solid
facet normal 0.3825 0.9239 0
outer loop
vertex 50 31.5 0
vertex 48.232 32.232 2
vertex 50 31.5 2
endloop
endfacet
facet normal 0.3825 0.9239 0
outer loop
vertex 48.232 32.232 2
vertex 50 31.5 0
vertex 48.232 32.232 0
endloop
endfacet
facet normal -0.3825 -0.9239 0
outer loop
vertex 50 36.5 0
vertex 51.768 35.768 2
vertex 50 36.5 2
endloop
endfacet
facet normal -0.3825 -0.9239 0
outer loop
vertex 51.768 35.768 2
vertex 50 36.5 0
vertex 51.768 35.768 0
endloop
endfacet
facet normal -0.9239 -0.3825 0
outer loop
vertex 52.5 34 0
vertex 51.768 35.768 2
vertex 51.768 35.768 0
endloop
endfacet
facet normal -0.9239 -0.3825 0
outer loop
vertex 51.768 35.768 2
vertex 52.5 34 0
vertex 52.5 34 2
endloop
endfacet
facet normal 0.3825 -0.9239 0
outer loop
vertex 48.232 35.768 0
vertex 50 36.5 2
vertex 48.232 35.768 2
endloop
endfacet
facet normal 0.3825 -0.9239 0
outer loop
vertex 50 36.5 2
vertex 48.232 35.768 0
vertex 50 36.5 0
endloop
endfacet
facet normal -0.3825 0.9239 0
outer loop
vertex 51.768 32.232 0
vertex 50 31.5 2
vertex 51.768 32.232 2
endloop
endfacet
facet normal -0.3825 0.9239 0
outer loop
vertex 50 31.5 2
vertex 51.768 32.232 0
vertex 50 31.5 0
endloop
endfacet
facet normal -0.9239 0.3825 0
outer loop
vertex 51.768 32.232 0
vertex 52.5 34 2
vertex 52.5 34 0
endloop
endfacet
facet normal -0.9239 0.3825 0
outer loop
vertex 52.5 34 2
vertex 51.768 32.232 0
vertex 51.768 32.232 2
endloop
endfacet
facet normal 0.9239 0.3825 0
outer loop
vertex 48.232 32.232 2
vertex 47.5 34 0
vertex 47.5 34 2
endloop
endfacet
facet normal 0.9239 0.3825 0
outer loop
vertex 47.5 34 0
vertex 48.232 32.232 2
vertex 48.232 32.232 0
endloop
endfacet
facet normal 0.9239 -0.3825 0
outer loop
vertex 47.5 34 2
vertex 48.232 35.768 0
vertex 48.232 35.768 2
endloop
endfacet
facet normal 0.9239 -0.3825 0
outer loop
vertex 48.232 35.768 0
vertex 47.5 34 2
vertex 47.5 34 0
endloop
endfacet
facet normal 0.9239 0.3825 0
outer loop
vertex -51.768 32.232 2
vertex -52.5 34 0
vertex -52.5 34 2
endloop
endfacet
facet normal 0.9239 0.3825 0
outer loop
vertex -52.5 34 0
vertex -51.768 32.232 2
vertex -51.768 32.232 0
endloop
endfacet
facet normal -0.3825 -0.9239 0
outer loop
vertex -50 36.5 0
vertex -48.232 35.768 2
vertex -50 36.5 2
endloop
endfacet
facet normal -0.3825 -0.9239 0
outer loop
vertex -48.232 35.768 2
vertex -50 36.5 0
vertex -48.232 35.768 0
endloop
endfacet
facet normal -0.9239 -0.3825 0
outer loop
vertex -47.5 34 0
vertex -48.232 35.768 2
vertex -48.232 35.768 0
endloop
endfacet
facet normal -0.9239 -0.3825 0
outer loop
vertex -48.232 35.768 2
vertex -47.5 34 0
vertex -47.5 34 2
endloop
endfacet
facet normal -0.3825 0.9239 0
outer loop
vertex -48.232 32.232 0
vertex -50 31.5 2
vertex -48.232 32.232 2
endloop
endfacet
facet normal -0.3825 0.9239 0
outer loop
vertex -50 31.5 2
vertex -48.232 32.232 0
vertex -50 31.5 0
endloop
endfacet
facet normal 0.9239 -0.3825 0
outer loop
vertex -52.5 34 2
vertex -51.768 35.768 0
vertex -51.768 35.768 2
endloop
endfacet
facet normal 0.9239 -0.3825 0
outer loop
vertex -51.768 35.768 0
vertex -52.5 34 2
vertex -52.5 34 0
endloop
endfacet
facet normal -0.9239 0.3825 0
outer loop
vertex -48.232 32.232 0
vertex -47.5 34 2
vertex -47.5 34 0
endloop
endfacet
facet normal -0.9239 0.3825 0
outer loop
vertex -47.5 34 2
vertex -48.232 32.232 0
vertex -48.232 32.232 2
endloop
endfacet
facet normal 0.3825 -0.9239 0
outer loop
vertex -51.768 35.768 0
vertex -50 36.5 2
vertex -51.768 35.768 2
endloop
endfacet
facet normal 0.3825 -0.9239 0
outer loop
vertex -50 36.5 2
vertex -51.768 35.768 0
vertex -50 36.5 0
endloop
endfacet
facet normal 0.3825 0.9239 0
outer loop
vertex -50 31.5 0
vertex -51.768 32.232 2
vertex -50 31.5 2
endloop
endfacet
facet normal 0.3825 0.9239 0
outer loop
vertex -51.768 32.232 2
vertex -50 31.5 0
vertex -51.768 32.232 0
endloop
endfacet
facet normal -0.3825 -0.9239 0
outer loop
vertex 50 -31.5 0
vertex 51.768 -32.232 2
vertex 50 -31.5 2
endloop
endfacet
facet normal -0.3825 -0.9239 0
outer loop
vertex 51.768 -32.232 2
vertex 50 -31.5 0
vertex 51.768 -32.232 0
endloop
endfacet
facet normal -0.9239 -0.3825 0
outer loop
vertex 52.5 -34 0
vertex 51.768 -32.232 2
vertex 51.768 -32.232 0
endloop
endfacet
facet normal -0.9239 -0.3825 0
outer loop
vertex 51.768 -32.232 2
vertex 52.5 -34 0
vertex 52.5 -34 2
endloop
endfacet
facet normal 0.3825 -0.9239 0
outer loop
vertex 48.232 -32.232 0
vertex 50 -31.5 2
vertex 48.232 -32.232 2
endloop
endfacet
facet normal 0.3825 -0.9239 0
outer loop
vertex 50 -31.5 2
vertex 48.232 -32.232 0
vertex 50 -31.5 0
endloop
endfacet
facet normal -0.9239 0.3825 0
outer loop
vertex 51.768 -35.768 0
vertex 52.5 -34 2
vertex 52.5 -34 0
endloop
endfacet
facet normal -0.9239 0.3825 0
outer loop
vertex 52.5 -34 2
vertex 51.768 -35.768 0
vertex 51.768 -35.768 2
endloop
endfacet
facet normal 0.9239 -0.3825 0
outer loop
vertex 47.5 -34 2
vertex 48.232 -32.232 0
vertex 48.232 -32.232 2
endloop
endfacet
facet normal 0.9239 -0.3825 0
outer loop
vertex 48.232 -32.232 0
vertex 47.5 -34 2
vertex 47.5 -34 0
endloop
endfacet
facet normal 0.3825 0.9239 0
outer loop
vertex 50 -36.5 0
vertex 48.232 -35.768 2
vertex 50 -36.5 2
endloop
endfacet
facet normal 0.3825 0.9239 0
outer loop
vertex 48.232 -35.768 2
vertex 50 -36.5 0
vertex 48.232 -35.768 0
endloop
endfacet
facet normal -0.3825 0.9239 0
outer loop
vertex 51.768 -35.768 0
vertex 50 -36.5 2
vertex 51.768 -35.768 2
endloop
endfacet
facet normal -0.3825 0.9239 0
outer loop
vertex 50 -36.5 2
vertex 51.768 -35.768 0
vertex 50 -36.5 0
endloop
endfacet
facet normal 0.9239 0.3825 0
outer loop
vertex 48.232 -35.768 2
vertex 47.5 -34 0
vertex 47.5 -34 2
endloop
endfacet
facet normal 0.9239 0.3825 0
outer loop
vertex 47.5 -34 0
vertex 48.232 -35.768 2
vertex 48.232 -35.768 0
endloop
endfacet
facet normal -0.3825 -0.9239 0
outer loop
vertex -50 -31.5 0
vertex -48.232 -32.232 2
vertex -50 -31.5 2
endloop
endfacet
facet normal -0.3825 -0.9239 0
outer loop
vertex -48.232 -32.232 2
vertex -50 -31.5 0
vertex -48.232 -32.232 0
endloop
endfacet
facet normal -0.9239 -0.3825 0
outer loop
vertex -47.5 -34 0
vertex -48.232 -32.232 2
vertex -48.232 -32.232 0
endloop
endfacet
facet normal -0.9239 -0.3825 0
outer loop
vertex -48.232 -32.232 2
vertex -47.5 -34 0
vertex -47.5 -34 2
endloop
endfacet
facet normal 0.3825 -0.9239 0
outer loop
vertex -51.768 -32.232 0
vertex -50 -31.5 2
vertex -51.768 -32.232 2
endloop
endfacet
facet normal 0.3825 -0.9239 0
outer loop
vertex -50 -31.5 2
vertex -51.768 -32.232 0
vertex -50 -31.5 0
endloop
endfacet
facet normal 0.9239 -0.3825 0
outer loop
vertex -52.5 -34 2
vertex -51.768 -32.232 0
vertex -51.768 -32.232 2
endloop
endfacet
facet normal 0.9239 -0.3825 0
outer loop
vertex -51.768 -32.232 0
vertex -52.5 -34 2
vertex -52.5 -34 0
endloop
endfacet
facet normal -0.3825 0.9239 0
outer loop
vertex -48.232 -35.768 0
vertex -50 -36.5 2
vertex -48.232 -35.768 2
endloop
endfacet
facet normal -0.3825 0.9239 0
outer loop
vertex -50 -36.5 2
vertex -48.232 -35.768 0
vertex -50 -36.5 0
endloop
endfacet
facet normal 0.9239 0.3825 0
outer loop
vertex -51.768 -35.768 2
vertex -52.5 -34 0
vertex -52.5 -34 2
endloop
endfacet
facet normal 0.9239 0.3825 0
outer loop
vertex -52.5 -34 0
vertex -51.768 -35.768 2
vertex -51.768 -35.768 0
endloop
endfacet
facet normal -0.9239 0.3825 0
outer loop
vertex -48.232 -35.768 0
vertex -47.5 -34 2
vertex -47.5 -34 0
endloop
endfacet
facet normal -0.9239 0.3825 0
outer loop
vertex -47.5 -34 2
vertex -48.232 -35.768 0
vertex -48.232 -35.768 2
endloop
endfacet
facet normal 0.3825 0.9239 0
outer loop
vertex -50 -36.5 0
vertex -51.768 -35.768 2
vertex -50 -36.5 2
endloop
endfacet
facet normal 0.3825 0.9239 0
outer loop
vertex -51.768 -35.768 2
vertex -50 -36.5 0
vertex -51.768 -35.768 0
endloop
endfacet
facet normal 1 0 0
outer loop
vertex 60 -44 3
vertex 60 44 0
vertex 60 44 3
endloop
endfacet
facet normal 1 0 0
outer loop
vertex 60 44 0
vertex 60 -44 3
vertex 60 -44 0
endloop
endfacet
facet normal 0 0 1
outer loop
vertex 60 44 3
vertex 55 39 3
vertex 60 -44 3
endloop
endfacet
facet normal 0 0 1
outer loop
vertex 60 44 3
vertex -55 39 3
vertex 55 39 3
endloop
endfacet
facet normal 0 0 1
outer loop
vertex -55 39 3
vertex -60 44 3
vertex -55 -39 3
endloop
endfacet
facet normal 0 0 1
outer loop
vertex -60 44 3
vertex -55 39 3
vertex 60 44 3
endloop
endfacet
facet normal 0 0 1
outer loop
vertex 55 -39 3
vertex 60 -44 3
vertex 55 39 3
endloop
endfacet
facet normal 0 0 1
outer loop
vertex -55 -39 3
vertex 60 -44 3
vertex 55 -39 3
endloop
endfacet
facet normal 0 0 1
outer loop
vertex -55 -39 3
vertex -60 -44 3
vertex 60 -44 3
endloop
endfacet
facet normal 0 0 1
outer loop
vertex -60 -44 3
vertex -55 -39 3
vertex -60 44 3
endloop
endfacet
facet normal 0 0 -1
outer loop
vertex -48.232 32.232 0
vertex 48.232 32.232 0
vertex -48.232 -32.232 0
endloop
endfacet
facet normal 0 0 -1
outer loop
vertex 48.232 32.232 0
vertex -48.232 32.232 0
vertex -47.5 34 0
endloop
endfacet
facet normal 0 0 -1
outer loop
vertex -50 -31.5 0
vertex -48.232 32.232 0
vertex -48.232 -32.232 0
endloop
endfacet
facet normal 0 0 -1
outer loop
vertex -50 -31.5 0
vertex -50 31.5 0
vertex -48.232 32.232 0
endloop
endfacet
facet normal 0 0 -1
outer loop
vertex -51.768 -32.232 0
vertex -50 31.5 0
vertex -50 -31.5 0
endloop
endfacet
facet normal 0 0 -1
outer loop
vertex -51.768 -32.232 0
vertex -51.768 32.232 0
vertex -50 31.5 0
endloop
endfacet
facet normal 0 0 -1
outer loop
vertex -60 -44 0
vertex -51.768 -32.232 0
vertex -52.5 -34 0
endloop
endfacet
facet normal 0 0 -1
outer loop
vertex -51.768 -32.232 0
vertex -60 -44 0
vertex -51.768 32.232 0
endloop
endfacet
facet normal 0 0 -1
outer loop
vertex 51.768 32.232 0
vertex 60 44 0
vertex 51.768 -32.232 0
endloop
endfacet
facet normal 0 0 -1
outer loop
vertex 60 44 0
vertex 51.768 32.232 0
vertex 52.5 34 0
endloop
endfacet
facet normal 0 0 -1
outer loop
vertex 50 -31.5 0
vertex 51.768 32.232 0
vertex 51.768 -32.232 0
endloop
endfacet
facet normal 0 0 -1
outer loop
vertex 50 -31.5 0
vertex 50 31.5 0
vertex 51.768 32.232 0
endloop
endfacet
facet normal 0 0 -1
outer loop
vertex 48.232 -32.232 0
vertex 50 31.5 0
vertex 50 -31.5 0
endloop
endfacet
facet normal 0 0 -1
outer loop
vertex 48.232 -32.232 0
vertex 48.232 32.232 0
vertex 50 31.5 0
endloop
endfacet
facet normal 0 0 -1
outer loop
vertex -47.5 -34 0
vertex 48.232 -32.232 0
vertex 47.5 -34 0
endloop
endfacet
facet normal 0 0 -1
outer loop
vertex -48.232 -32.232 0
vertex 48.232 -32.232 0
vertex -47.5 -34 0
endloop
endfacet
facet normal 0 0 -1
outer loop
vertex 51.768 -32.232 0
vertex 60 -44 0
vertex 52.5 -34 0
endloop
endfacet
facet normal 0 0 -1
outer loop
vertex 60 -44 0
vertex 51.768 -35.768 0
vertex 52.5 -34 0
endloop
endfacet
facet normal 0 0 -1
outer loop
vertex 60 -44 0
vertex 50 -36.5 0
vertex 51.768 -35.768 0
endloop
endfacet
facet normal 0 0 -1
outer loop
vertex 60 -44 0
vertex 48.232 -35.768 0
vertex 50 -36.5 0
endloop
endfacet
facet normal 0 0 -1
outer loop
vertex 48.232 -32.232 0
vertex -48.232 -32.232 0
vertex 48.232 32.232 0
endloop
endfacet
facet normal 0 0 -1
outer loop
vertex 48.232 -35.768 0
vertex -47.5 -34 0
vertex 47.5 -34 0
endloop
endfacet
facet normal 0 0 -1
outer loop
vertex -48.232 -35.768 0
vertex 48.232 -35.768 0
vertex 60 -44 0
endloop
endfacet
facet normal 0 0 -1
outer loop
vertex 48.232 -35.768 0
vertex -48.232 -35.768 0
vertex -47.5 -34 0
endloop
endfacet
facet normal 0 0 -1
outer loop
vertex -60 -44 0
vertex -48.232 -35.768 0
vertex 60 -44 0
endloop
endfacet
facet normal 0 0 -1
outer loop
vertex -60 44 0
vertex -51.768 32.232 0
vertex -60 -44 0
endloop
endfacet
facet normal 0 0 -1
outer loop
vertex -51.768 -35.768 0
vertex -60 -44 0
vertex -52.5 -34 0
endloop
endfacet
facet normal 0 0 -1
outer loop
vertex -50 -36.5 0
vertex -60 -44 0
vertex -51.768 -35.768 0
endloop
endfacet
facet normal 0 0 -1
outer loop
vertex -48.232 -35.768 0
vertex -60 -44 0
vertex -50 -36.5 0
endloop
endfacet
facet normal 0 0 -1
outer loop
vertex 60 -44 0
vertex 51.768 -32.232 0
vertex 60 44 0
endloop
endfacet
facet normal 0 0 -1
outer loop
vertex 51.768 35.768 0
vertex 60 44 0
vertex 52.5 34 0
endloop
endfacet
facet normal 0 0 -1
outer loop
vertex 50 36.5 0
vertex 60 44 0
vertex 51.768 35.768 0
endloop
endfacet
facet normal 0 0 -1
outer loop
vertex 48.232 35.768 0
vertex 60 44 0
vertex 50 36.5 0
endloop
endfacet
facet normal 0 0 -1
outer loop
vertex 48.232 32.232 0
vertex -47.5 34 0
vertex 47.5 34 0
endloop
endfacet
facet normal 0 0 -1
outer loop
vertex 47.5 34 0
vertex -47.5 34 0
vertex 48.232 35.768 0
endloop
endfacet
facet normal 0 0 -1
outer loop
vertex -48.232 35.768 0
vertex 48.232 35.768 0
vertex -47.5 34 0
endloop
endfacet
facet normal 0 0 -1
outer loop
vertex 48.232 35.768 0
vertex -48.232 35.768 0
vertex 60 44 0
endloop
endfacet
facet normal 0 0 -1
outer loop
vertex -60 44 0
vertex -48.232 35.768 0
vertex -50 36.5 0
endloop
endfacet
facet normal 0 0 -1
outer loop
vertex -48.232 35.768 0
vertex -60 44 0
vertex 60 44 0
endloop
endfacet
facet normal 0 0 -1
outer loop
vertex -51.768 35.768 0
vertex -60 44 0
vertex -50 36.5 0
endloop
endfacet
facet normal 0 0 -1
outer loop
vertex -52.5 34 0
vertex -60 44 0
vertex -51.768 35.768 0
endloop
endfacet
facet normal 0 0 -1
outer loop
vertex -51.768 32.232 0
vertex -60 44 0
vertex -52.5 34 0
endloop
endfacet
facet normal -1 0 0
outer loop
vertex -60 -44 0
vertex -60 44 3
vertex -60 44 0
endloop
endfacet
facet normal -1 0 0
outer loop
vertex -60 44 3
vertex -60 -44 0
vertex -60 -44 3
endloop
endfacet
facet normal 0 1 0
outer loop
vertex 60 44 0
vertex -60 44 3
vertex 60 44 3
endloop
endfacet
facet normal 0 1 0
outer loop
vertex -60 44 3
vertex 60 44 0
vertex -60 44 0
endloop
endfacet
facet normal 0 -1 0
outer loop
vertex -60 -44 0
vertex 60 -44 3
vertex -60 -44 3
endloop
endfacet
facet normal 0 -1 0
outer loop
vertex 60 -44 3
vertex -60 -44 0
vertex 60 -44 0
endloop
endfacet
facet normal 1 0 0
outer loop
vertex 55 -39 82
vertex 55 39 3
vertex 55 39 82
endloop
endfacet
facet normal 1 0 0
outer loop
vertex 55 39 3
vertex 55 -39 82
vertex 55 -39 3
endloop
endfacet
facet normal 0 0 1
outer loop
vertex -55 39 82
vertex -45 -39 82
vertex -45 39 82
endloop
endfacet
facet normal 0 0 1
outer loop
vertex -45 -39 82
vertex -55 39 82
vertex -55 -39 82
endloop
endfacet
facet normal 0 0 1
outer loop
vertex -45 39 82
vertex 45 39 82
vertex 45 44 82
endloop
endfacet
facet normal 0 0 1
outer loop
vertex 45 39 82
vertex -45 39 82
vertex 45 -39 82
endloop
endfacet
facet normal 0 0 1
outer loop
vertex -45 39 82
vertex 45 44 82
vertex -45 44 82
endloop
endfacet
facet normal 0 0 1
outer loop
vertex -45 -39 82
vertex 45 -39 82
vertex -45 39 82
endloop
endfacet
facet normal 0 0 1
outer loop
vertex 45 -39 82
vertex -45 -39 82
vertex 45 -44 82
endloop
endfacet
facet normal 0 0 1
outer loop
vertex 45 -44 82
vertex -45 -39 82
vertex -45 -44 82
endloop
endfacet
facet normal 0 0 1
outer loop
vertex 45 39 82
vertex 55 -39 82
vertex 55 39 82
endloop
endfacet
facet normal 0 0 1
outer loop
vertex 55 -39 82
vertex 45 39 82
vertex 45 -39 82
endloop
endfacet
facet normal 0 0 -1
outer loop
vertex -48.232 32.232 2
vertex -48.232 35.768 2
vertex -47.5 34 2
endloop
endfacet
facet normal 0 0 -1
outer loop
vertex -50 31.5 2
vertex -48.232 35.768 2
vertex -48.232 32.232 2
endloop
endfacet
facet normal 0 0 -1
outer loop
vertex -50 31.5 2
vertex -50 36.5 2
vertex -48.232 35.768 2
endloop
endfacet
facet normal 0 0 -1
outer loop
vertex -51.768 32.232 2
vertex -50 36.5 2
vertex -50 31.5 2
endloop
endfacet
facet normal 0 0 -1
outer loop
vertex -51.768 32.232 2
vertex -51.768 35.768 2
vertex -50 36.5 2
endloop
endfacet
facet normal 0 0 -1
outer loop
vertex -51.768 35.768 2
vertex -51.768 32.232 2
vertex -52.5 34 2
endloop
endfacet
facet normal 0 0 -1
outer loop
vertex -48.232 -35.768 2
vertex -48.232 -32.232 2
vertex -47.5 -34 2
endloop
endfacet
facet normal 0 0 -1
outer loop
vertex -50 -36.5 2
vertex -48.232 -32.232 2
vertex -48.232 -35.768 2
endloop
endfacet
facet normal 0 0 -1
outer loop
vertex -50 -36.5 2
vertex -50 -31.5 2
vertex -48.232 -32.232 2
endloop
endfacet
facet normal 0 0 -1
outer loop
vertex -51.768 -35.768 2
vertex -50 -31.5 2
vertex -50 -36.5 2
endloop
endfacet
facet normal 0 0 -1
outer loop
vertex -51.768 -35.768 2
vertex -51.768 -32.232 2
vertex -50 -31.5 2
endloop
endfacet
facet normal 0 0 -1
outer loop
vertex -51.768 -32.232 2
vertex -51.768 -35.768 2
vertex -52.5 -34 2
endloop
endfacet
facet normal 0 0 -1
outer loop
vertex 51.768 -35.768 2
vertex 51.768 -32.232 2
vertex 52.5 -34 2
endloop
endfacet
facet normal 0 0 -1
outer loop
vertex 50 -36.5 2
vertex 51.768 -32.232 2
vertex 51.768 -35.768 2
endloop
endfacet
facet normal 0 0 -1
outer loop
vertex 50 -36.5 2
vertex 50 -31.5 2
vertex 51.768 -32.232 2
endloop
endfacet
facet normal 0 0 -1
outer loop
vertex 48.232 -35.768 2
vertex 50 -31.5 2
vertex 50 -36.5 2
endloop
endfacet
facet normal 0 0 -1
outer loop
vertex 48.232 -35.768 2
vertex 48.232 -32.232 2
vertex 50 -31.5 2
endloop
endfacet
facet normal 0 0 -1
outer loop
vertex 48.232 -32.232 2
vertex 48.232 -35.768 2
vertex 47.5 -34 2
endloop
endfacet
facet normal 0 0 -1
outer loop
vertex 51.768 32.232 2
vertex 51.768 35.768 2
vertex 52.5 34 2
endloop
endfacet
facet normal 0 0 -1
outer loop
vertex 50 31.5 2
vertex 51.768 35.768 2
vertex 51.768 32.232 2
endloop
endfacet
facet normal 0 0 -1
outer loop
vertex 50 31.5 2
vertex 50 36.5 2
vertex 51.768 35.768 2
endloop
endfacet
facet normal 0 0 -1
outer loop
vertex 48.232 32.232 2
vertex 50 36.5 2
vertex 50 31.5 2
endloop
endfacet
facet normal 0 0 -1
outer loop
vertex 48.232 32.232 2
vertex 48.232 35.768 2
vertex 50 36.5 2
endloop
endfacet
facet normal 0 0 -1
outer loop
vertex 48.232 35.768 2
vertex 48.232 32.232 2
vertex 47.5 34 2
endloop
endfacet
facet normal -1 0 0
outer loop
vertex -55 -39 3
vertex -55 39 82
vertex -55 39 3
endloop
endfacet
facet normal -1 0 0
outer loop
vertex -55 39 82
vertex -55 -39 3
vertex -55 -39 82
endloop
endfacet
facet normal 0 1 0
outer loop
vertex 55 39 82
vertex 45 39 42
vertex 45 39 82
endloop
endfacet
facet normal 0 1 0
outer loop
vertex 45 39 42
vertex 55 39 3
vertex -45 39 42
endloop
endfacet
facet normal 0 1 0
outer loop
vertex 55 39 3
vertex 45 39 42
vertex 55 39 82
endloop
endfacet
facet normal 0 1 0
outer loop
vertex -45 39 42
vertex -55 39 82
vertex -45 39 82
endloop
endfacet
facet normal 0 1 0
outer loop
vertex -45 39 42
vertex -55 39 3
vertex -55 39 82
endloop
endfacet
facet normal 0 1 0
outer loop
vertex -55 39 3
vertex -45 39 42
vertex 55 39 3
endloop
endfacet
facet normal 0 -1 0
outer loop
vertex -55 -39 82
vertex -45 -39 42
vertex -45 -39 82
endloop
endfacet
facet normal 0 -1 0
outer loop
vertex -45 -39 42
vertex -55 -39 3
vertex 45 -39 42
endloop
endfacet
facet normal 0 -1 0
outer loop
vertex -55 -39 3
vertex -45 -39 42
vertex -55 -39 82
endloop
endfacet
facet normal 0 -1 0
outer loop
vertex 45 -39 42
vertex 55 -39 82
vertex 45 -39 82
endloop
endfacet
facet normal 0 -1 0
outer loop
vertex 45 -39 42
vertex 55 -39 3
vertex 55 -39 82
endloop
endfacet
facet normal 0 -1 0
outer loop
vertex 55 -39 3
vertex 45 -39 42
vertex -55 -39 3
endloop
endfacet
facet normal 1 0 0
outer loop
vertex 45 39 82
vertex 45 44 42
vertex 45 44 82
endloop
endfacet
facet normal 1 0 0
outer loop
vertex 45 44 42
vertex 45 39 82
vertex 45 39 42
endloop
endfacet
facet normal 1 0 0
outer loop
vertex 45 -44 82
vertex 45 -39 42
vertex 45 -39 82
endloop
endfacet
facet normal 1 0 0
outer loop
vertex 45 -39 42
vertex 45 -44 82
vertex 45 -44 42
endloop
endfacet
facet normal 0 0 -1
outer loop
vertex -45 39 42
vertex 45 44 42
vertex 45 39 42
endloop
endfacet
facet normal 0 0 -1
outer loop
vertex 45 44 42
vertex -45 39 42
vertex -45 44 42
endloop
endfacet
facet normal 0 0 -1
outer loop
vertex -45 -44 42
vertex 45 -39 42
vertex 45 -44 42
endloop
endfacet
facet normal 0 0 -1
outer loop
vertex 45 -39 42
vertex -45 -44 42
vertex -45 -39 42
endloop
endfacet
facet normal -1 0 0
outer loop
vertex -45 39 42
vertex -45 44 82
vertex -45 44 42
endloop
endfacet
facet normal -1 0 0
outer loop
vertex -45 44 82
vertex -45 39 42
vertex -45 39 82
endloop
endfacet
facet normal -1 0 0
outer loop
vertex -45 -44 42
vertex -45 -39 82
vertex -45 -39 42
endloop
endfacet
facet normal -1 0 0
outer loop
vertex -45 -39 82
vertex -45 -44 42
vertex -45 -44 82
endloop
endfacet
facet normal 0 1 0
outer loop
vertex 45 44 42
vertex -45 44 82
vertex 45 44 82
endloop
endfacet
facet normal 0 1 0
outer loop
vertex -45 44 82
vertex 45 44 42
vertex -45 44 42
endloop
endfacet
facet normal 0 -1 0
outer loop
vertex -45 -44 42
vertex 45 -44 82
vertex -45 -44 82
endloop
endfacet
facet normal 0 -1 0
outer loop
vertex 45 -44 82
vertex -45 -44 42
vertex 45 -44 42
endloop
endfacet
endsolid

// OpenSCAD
// Parameters
overall_width_mm = 120; //[60:240:1]
overall_depth_mm = 88; //[44:176:1]
overall_height_mm = 120; //[60:240:1]
foot_thickness_mm = 3; //[1.5:6:0.5]
foot_corner_radius_mm = 2; //[0:6:0.5]
mount_hole_count = 4; //[2:8:1]
mount_hole_diameter_mm = 5; //[2:10:0.5]
mount_hole_edge_margin_mm = 10; //[5:25:1]
lamination_height_mm = 80; //[40:160:1]
lamination_width_mm = 110; //[55:220:1]
lamination_depth_mm = 78; //[39:156:1]
bobbin_width_mm = 90; //[45:180:1]
bobbin_depth_mm = 88; //[44:176:1]
bobbin_height_mm = 40; //[20:80:1]
bobbin_corner_radius_mm = 2; //[0:6:0.5]
terminal_height_mm = 0; //[0:40:1]
foot_width_mm = 120; //[60:240:1]
foot_depth_mm = 88; //[44:176:1]
connection_overlap_mm = 1; //[0.5:2:0.5]
hole_cut_extra_mm = 2; //[1:6:1]
terminal_width_mm = 60; //[30:120:1]
terminal_depth_mm = 30; //[15:80:1]

// Base shapes
module base_foot_blank() {
  color("Silver") {
    translate([0, 0, foot_thickness_mm / 2])
      cube([foot_width_mm, foot_depth_mm, foot_thickness_mm], center=true);
  }
}

module mount_hole_cyl(x, y) {
  translate([x, y, foot_thickness_mm / 2])
    cylinder(r=mount_hole_diameter_mm / 2, h=foot_thickness_mm + hole_cut_extra_mm, center=true);
}

module laminated_core_block() {
  color("DimGray") {
    translate([0, 0, foot_thickness_mm + lamination_height_mm / 2 - connection_overlap_mm])
      cube([lamination_width_mm, lamination_depth_mm, lamination_height_mm], center=true);
  }
}

module bobbin_coil_body() {
  color("Black") {
    translate([0, 0, foot_thickness_mm + lamination_height_mm / 2 + bobbin_height_mm / 2 - connection_overlap_mm])
      cube([bobbin_width_mm, bobbin_depth_mm, bobbin_height_mm], center=true);
  }
}

module terminal_block_volume() {
  color("Copper") {
    translate([0, 0, foot_thickness_mm + lamination_height_mm + terminal_height_mm / 2 - connection_overlap_mm])
      cube([terminal_width_mm, terminal_depth_mm, terminal_height_mm], center=true);
  }
}

// Operations
module mounting_holes() {
  union() {
    mount_hole_cyl(foot_width_mm / 2 - mount_hole_edge_margin_mm, foot_depth_mm / 2 - mount_hole_edge_margin_mm);
    mount_hole_cyl(-(foot_width_mm / 2 - mount_hole_edge_margin_mm), foot_depth_mm / 2 - mount_hole_edge_margin_mm);
    mount_hole_cyl(foot_width_mm / 2 - mount_hole_edge_margin_mm, -(foot_depth_mm / 2 - mount_hole_edge_margin_mm));
    mount_hole_cyl(-(foot_width_mm / 2 - mount_hole_edge_margin_mm), -(foot_depth_mm / 2 - mount_hole_edge_margin_mm));
  }
}

module base_foot() {
  difference() {
    base_foot_blank();
    mounting_holes();
  }
}

module transformer_no_terminals() {
  union() {
    base_foot();
    laminated_core_block();
    bobbin_coil_body();
  }
}

module transformer() {
  union() {
    transformer_no_terminals();
    terminal_block_volume();
  }
}

// Assembly
module assembly() {
  transformer();
}

assembly();
